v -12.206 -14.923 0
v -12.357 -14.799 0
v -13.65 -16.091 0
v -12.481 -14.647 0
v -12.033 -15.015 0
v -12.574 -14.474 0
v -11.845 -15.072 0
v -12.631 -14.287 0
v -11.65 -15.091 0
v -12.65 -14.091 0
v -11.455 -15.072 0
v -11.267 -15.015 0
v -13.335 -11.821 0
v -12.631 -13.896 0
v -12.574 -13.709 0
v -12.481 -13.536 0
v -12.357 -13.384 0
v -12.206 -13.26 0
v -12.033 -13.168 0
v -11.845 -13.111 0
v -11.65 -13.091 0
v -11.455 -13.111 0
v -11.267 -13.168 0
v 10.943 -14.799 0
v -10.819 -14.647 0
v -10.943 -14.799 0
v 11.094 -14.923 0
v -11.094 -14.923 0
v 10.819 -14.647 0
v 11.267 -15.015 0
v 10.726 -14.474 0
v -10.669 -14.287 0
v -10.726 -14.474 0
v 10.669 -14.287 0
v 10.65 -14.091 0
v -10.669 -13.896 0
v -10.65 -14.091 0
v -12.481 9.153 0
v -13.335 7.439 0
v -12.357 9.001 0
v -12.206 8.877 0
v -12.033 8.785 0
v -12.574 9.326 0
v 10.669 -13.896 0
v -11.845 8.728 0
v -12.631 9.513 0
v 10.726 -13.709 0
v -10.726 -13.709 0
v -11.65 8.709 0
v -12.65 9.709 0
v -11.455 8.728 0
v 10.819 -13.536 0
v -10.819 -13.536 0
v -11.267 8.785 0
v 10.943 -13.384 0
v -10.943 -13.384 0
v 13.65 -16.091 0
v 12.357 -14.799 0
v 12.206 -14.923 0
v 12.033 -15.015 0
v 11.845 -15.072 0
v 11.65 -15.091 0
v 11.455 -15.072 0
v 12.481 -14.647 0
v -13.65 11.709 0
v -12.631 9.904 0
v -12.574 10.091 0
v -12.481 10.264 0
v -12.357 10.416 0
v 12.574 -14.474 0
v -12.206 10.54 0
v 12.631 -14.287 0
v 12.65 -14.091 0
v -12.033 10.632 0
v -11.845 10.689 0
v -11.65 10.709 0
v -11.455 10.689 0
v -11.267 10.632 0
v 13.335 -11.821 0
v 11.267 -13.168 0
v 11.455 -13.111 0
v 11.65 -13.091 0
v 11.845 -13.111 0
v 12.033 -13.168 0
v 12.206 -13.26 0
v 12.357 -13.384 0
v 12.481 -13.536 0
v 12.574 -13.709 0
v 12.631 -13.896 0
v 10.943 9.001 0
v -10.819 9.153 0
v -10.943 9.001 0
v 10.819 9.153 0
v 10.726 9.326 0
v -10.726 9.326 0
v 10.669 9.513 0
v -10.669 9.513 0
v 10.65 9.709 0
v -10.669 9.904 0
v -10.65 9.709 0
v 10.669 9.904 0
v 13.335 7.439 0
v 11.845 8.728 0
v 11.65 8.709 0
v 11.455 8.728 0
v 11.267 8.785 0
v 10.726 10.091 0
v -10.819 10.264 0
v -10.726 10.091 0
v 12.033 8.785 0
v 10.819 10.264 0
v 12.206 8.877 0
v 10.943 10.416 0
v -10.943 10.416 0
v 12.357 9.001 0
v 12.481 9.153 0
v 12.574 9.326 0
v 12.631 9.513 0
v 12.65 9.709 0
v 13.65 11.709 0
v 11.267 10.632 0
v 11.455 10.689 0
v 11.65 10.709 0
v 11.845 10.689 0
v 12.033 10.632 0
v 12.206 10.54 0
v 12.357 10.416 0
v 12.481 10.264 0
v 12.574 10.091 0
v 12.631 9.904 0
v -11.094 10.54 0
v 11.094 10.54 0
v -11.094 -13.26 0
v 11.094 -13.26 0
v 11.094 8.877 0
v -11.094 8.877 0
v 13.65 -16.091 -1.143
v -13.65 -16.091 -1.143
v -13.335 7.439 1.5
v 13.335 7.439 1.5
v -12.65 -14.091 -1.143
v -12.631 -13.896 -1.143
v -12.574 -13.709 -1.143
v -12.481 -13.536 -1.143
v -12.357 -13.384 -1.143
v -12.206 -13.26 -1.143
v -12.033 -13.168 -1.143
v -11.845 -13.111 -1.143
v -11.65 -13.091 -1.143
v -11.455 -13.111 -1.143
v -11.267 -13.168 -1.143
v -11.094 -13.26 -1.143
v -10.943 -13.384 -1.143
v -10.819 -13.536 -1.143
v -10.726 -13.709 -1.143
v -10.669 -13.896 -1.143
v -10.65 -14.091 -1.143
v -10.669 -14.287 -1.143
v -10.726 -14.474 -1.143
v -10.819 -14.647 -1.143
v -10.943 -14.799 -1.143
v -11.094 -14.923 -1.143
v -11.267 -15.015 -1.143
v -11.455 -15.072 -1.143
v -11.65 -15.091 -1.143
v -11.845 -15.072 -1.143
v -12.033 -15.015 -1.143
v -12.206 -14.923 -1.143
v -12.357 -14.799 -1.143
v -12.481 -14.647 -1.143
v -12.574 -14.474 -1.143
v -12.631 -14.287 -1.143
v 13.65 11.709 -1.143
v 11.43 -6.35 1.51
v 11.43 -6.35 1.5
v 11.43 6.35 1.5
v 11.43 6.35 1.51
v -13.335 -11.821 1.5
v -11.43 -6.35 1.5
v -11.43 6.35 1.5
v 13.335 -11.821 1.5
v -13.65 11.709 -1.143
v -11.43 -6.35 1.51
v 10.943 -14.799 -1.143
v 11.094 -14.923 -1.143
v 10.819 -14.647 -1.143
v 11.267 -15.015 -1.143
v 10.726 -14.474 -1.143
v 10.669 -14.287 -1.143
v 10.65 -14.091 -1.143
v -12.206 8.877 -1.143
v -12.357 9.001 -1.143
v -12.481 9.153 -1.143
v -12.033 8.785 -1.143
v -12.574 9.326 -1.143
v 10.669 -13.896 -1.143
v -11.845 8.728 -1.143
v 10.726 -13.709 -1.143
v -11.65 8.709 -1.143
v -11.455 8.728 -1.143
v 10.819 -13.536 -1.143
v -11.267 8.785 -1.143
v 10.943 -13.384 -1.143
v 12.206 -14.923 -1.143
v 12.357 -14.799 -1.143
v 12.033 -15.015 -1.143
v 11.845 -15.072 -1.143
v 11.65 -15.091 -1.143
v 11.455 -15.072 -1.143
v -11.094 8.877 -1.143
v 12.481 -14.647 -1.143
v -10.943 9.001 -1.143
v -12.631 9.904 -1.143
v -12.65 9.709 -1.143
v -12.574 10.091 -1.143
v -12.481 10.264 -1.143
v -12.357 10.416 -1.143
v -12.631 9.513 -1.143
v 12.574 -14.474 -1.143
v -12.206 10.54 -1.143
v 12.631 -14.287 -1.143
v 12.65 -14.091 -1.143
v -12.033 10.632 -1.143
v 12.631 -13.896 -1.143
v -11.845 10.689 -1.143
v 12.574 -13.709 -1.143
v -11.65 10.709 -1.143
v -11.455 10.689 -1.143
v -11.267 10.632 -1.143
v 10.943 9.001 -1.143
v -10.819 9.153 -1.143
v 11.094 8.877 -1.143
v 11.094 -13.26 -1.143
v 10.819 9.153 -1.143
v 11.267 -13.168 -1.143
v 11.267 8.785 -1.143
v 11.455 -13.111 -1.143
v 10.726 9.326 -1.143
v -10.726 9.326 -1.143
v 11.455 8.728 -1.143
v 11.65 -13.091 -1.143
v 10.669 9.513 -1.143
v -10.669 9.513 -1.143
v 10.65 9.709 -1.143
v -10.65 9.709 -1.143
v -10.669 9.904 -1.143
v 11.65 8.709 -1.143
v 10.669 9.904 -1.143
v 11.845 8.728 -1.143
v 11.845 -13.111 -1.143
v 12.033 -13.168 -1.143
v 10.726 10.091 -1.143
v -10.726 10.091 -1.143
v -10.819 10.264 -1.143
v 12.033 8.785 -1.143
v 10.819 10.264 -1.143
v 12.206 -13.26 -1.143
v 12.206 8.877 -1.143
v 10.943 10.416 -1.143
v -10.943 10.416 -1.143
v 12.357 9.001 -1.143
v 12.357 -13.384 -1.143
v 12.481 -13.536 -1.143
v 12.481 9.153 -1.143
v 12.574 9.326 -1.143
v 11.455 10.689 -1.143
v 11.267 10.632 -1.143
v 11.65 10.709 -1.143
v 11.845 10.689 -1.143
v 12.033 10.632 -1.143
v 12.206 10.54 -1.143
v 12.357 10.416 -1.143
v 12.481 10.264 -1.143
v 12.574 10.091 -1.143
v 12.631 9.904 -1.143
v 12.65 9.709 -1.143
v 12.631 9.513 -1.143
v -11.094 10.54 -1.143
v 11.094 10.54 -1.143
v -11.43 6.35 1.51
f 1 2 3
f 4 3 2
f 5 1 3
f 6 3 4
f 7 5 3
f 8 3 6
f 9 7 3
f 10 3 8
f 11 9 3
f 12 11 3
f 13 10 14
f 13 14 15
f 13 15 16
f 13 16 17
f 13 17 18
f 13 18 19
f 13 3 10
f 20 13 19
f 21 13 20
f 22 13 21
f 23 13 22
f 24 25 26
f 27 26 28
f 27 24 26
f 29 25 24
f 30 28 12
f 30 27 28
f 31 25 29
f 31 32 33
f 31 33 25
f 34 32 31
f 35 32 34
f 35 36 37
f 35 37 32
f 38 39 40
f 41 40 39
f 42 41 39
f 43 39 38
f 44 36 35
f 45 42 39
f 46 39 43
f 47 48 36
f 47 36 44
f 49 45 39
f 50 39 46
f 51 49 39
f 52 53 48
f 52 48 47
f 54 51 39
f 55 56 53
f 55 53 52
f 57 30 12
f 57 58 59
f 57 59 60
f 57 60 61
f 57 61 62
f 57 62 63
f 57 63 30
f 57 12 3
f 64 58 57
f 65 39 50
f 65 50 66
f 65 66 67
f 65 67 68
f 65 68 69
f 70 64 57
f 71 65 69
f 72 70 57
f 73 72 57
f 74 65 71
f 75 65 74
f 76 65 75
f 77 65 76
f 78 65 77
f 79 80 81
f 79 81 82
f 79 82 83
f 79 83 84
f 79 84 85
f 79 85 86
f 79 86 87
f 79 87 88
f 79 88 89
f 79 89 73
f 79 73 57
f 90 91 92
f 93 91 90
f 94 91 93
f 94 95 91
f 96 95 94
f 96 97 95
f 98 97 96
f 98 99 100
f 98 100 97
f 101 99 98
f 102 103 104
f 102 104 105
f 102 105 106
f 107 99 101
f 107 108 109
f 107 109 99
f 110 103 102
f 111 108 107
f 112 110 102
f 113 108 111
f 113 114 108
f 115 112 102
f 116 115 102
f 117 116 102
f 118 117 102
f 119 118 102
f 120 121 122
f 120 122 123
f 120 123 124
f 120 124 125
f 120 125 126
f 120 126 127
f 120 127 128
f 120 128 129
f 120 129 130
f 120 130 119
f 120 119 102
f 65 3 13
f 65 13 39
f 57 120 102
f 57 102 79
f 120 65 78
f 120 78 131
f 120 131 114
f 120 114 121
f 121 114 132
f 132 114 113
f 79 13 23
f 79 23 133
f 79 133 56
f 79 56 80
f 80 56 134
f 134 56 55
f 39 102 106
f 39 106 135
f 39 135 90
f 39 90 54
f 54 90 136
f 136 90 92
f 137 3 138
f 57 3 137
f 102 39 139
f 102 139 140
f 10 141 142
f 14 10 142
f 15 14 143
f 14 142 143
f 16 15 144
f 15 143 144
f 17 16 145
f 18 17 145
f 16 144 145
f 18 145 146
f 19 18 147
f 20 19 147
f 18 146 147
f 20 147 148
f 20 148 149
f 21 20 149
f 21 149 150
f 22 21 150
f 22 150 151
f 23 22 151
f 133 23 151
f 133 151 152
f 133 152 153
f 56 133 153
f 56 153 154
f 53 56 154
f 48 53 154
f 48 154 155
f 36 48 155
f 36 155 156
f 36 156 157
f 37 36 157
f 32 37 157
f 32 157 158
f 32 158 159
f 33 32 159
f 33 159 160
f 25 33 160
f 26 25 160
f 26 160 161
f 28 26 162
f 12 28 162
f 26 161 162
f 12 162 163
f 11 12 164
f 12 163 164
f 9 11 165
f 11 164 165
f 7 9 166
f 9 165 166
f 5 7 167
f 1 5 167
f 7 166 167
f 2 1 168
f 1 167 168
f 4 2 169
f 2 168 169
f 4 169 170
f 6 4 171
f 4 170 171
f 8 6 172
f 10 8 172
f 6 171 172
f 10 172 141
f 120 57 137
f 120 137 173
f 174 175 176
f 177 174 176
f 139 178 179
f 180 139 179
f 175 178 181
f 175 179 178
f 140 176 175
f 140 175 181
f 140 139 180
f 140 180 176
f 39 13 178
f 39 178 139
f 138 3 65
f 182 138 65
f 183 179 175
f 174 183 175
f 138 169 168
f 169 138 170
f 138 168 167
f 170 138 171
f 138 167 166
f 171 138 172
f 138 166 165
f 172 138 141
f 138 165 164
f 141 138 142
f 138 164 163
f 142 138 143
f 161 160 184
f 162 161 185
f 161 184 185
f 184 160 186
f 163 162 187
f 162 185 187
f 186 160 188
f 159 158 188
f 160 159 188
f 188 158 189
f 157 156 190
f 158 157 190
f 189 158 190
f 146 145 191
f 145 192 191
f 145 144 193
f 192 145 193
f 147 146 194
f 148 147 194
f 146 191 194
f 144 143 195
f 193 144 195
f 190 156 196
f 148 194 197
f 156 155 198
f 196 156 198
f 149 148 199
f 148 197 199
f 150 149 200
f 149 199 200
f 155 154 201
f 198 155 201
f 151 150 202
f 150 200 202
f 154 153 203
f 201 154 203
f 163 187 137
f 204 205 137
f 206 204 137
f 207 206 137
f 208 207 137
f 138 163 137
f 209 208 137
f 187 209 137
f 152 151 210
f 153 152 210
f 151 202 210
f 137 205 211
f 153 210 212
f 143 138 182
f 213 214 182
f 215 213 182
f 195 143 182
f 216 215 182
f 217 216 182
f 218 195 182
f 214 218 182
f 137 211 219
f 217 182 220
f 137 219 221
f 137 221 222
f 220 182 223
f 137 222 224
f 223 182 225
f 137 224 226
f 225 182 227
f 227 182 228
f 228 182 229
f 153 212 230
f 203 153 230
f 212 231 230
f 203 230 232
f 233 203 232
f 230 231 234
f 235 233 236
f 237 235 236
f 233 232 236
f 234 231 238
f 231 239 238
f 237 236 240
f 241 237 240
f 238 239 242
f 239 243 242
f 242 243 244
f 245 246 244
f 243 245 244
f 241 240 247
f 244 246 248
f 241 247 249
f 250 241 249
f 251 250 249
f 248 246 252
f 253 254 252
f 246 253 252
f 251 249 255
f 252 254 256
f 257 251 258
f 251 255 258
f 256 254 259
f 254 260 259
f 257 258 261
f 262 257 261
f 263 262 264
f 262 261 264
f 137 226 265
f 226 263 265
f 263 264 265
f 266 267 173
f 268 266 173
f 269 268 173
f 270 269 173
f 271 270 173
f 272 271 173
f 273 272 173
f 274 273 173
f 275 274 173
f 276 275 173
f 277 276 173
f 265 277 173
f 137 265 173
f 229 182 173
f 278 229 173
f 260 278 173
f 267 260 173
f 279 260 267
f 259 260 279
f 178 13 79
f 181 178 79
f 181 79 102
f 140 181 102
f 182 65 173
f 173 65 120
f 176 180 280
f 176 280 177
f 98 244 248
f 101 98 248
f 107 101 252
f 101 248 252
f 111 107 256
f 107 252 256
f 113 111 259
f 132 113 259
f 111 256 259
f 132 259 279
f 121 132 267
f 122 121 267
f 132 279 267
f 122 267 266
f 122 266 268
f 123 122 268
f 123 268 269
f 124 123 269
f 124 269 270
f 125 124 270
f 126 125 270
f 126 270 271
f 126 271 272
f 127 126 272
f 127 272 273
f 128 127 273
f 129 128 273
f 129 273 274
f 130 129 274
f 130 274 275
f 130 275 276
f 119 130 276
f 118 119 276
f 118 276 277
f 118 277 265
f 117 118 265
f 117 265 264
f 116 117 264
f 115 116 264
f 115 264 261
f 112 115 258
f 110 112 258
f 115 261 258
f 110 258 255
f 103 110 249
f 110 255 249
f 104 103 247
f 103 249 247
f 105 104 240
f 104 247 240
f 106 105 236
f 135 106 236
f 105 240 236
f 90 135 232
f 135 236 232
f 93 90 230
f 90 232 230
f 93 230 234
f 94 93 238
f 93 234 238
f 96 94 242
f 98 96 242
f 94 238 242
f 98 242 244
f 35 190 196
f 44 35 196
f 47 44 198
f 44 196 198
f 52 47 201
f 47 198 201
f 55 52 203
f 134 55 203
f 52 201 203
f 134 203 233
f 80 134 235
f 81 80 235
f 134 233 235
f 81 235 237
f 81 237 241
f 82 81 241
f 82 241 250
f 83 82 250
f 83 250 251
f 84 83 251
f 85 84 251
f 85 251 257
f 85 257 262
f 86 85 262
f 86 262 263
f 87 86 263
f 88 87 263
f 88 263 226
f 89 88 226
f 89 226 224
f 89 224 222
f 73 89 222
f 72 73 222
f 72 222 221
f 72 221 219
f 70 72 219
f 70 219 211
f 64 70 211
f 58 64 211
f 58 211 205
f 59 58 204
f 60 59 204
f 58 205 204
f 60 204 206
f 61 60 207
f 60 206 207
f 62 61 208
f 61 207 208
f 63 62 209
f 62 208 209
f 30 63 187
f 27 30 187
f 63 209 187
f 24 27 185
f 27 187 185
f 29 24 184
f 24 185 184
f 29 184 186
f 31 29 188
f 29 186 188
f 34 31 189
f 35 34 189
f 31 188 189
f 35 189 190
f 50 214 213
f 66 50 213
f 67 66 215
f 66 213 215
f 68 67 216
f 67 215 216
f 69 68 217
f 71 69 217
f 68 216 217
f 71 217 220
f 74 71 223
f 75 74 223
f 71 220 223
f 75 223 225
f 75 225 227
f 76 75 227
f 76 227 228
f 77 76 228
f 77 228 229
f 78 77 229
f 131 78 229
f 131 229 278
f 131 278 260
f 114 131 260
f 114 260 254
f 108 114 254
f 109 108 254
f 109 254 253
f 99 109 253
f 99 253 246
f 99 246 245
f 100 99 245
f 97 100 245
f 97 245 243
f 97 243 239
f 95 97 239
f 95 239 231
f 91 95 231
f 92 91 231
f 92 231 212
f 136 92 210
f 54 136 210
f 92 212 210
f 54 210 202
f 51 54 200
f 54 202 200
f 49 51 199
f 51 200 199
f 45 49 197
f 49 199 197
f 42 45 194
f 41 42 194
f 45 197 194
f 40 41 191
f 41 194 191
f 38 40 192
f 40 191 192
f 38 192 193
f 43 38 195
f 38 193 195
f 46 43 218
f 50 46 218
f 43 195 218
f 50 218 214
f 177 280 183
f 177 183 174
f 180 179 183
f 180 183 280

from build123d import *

# Parameters (mm, degrees)
F0_W     = 27.3
F0_H     = 27.8
F0_W_2   = 26.67
F0_H_2   = 19.26
F0_W_3   = 22.86
F0_H_3   = 12.7
F1_DEPTH = 1.143
F2_DEPTH = 1.5
F3_DEPTH = 1.51
F5_D     = 2


with BuildPart() as f1:
    # F0 (on Top) → F1 (new body)
    with BuildSketch(Plane.XY):
        with Locations((0, -2.191441)):
            Rectangle(F0_W, F0_H)
        with Locations((0, -2.191441)):
            Rectangle(F0_W_2, F0_H_2, mode=Mode.SUBTRACT)
        with Locations((0, -2.191441)):
            Rectangle(F0_W_2, F0_H_2)
        Rectangle(F0_W_3, F0_H_3, mode=Mode.SUBTRACT)
        Rectangle(F0_W_3, F0_H_3)
    extrude(amount=-F1_DEPTH)

    # F0 (on Top) → F2 (join)
    with BuildSketch(Plane.XY):
        with Locations((0, -2.191441)):
            Rectangle(F0_W_2, F0_H_2)
        Rectangle(F0_W_3, F0_H_3, mode=Mode.SUBTRACT)
        Rectangle(F0_W_3, F0_H_3)
    extrude(amount=F2_DEPTH)

    # F0 (on Top) → F3 (join)
    with BuildSketch(Plane.XY):
        Rectangle(F0_W_3, F0_H_3)
    extrude(amount=F3_DEPTH)

    # F5 (through all)
    with Locations(Plane.XY):
        with Locations((-11.65, 9.708559), (11.65, 9.708559), (11.65, -14.091441), (-11.65, -14.091441)):
            Hole(F5_D / 2)


solid = f1.part
